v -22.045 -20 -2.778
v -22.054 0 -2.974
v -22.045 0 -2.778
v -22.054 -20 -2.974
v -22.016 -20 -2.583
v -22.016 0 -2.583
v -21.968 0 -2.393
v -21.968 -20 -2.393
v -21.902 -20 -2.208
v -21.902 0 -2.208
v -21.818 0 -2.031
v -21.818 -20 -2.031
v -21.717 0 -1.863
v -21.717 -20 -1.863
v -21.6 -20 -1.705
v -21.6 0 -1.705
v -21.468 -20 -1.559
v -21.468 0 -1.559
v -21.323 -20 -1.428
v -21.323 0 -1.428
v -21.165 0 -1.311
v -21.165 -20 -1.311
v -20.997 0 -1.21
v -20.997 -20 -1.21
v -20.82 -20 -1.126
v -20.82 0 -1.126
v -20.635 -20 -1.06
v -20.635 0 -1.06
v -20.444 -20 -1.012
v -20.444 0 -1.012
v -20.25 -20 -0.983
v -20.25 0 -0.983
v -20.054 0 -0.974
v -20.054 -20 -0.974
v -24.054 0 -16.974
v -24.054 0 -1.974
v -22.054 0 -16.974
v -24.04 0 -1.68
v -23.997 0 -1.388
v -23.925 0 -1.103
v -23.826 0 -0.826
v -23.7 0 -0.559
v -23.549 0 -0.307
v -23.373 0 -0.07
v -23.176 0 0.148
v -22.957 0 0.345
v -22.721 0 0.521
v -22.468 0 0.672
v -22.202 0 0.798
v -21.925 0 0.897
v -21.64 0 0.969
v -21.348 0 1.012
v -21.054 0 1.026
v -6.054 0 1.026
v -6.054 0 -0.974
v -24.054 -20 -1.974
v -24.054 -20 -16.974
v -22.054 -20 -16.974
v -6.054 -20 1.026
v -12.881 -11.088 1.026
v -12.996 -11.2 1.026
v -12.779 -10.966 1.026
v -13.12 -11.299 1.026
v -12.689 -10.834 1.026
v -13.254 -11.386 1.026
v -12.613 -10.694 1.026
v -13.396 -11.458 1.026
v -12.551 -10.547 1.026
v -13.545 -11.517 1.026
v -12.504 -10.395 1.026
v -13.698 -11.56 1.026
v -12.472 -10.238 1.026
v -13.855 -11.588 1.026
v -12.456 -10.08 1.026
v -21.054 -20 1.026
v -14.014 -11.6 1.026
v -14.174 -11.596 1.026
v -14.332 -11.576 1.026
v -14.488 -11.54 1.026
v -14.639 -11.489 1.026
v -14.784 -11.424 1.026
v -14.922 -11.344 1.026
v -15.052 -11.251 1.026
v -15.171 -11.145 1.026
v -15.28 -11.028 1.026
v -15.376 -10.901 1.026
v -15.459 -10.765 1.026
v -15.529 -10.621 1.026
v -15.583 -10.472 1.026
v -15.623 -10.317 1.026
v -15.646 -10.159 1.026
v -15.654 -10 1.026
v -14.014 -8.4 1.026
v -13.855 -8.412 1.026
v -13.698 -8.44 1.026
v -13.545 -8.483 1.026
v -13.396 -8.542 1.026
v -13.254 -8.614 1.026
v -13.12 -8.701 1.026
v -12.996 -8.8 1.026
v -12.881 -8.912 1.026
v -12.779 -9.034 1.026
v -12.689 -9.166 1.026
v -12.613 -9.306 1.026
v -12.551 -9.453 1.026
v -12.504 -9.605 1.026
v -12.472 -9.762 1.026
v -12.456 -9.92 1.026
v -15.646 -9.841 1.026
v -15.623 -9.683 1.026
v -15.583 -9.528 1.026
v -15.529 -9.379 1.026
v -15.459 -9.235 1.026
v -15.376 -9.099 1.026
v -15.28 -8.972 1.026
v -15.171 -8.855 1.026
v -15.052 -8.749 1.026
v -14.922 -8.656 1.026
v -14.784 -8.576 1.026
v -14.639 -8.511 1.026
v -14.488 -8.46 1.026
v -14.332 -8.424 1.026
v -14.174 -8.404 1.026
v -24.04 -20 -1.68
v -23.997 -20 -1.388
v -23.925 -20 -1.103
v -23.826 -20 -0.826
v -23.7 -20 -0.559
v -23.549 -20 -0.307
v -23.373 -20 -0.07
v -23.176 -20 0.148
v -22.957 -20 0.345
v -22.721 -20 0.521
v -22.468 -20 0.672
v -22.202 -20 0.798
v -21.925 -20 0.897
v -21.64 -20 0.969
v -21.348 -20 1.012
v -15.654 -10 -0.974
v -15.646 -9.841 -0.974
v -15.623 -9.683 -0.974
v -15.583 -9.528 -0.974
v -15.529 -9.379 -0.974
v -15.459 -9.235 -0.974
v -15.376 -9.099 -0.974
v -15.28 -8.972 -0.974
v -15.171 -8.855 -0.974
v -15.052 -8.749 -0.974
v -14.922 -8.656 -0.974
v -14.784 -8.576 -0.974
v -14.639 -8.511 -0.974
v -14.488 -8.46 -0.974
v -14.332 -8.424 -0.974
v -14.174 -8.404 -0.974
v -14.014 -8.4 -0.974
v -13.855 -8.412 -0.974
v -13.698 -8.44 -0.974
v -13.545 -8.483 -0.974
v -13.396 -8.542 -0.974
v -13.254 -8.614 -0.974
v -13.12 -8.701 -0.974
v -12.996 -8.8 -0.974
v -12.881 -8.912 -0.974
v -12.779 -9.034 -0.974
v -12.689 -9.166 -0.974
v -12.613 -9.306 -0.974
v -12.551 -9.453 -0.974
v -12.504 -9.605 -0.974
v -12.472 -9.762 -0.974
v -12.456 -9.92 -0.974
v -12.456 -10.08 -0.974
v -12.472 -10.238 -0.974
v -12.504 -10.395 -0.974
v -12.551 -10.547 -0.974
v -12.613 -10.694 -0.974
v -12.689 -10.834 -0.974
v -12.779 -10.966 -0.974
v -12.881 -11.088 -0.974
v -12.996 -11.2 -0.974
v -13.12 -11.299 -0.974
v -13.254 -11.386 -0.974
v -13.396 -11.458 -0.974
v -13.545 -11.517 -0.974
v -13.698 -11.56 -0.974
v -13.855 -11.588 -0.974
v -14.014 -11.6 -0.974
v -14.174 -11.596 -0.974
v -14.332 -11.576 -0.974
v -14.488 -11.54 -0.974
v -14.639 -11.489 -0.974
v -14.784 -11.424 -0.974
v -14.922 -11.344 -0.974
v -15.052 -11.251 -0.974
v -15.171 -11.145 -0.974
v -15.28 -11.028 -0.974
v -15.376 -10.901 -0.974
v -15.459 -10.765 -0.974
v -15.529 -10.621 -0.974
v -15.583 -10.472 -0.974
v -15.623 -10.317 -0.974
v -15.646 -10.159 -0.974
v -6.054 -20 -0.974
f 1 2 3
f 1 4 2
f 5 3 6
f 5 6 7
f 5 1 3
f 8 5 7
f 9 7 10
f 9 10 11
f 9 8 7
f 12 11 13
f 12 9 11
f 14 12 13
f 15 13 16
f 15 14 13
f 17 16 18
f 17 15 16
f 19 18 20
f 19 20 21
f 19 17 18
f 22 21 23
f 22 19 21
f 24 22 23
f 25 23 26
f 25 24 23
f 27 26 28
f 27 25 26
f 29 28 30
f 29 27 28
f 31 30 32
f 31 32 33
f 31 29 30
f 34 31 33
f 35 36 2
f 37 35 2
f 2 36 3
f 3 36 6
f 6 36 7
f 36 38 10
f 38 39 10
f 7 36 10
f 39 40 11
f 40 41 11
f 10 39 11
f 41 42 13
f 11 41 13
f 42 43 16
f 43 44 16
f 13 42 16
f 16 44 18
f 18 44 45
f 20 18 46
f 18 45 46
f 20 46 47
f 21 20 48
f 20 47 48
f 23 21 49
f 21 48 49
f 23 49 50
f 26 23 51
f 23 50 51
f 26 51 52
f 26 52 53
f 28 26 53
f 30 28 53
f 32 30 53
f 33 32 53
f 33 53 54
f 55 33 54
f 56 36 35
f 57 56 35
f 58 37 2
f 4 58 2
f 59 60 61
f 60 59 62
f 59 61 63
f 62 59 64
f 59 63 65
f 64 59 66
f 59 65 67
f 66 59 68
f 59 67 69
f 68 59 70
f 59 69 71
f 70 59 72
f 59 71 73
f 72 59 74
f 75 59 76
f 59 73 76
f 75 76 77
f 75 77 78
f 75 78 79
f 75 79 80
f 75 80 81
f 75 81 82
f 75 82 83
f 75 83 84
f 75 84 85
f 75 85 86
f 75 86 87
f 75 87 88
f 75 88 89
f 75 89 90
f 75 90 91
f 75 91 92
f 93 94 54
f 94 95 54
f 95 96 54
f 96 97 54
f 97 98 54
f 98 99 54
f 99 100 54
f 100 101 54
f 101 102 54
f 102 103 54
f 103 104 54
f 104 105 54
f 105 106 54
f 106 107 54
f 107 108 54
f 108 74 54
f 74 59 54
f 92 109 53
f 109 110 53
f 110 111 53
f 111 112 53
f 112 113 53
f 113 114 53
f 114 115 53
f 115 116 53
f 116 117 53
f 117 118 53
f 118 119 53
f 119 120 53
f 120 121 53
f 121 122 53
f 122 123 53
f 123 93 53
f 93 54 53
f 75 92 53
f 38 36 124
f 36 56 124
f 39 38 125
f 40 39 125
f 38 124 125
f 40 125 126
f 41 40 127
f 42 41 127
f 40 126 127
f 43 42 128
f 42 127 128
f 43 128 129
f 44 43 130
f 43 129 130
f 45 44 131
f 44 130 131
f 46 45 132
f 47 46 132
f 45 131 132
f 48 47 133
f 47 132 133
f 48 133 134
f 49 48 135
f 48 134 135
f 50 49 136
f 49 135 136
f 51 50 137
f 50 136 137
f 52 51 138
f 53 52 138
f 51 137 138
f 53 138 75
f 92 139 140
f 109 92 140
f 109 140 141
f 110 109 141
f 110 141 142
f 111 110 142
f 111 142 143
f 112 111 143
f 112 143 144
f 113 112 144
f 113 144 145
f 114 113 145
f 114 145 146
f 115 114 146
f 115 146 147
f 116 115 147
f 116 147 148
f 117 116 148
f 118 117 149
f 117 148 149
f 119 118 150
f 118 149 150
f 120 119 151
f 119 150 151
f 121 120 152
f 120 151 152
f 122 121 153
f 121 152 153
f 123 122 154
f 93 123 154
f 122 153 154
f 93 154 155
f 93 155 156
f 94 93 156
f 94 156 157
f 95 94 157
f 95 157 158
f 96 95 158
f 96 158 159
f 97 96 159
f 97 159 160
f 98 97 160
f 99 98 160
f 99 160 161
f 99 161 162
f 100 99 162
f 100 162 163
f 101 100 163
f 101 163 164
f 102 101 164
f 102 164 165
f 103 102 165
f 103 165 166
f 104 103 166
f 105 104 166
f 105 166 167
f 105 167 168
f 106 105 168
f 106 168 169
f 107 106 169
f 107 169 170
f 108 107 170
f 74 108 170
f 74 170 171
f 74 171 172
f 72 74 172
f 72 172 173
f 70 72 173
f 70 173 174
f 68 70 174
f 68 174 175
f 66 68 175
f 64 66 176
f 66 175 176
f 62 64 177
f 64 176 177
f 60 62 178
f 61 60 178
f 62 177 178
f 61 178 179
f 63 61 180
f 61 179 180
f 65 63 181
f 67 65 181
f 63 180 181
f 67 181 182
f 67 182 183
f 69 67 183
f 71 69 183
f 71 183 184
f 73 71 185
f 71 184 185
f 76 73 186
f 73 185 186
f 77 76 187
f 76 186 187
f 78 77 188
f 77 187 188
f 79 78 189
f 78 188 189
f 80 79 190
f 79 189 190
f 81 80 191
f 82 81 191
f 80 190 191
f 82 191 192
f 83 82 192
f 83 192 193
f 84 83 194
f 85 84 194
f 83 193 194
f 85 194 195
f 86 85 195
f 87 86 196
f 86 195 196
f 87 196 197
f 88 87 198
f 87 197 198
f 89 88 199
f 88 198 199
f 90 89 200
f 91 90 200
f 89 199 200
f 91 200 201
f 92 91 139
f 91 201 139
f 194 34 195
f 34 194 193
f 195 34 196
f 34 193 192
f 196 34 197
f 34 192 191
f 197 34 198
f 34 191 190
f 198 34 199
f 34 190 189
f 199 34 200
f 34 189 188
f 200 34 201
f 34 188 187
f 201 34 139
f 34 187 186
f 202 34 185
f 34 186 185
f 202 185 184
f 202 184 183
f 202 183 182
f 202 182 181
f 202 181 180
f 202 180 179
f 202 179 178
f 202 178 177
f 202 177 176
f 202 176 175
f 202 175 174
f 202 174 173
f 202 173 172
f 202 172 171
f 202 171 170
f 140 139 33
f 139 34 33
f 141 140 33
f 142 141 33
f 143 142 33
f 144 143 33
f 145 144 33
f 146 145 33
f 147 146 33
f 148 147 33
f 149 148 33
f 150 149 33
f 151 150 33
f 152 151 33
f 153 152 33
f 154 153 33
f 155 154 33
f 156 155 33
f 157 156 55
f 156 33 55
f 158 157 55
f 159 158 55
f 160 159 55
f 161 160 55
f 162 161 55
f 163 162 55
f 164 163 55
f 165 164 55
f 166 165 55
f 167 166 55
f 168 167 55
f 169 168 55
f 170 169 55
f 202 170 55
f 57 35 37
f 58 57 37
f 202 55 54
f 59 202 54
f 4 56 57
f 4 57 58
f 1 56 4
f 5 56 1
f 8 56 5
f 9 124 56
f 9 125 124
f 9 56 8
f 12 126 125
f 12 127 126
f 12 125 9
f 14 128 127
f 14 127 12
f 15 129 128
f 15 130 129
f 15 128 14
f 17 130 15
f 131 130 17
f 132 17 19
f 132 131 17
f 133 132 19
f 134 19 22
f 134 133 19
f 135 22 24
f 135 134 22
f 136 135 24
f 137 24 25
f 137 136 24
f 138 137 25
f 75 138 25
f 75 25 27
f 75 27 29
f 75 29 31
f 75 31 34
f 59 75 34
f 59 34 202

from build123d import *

# Parameters (mm, degrees)
F1_DEPTH = 20
F3_D     = 3.2
F4_R     = 3
F5_R     = 2


with BuildPart() as f1:
    # F0 (on Front) → F1 (new body)
    with BuildSketch(Plane.XZ):
        Polygon((-24.0542695144, 1.0263364321), (-24.0542695144, -16.9736635679), (-22.0542695144, -16.9736635679), (-22.0542695144, -0.9736635679), (-6.0542695144, -0.9736635679), (-6.0542695144, 1.0263364321), align=None)
    extrude(amount=F1_DEPTH)

    # F3 (through all)
    with Locations(Plane.XY.offset(1.0263364321)):
        with Locations((-14.0542695144, -10)):
            Hole(F3_D / 2)

    # F4
    f4_edges = [f1.edges().sort_by_distance(p)[0] for p in [
        (-24.05427, -10, 1.026336),
    ]]
    fillet(f4_edges, radius=F4_R)

    # F5
    f5_edges = [f1.edges().sort_by_distance(p)[0] for p in [
        (-22.05427, -10, -0.973664),
    ]]
    fillet(f5_edges, radius=F5_R)


solid = f1.part
